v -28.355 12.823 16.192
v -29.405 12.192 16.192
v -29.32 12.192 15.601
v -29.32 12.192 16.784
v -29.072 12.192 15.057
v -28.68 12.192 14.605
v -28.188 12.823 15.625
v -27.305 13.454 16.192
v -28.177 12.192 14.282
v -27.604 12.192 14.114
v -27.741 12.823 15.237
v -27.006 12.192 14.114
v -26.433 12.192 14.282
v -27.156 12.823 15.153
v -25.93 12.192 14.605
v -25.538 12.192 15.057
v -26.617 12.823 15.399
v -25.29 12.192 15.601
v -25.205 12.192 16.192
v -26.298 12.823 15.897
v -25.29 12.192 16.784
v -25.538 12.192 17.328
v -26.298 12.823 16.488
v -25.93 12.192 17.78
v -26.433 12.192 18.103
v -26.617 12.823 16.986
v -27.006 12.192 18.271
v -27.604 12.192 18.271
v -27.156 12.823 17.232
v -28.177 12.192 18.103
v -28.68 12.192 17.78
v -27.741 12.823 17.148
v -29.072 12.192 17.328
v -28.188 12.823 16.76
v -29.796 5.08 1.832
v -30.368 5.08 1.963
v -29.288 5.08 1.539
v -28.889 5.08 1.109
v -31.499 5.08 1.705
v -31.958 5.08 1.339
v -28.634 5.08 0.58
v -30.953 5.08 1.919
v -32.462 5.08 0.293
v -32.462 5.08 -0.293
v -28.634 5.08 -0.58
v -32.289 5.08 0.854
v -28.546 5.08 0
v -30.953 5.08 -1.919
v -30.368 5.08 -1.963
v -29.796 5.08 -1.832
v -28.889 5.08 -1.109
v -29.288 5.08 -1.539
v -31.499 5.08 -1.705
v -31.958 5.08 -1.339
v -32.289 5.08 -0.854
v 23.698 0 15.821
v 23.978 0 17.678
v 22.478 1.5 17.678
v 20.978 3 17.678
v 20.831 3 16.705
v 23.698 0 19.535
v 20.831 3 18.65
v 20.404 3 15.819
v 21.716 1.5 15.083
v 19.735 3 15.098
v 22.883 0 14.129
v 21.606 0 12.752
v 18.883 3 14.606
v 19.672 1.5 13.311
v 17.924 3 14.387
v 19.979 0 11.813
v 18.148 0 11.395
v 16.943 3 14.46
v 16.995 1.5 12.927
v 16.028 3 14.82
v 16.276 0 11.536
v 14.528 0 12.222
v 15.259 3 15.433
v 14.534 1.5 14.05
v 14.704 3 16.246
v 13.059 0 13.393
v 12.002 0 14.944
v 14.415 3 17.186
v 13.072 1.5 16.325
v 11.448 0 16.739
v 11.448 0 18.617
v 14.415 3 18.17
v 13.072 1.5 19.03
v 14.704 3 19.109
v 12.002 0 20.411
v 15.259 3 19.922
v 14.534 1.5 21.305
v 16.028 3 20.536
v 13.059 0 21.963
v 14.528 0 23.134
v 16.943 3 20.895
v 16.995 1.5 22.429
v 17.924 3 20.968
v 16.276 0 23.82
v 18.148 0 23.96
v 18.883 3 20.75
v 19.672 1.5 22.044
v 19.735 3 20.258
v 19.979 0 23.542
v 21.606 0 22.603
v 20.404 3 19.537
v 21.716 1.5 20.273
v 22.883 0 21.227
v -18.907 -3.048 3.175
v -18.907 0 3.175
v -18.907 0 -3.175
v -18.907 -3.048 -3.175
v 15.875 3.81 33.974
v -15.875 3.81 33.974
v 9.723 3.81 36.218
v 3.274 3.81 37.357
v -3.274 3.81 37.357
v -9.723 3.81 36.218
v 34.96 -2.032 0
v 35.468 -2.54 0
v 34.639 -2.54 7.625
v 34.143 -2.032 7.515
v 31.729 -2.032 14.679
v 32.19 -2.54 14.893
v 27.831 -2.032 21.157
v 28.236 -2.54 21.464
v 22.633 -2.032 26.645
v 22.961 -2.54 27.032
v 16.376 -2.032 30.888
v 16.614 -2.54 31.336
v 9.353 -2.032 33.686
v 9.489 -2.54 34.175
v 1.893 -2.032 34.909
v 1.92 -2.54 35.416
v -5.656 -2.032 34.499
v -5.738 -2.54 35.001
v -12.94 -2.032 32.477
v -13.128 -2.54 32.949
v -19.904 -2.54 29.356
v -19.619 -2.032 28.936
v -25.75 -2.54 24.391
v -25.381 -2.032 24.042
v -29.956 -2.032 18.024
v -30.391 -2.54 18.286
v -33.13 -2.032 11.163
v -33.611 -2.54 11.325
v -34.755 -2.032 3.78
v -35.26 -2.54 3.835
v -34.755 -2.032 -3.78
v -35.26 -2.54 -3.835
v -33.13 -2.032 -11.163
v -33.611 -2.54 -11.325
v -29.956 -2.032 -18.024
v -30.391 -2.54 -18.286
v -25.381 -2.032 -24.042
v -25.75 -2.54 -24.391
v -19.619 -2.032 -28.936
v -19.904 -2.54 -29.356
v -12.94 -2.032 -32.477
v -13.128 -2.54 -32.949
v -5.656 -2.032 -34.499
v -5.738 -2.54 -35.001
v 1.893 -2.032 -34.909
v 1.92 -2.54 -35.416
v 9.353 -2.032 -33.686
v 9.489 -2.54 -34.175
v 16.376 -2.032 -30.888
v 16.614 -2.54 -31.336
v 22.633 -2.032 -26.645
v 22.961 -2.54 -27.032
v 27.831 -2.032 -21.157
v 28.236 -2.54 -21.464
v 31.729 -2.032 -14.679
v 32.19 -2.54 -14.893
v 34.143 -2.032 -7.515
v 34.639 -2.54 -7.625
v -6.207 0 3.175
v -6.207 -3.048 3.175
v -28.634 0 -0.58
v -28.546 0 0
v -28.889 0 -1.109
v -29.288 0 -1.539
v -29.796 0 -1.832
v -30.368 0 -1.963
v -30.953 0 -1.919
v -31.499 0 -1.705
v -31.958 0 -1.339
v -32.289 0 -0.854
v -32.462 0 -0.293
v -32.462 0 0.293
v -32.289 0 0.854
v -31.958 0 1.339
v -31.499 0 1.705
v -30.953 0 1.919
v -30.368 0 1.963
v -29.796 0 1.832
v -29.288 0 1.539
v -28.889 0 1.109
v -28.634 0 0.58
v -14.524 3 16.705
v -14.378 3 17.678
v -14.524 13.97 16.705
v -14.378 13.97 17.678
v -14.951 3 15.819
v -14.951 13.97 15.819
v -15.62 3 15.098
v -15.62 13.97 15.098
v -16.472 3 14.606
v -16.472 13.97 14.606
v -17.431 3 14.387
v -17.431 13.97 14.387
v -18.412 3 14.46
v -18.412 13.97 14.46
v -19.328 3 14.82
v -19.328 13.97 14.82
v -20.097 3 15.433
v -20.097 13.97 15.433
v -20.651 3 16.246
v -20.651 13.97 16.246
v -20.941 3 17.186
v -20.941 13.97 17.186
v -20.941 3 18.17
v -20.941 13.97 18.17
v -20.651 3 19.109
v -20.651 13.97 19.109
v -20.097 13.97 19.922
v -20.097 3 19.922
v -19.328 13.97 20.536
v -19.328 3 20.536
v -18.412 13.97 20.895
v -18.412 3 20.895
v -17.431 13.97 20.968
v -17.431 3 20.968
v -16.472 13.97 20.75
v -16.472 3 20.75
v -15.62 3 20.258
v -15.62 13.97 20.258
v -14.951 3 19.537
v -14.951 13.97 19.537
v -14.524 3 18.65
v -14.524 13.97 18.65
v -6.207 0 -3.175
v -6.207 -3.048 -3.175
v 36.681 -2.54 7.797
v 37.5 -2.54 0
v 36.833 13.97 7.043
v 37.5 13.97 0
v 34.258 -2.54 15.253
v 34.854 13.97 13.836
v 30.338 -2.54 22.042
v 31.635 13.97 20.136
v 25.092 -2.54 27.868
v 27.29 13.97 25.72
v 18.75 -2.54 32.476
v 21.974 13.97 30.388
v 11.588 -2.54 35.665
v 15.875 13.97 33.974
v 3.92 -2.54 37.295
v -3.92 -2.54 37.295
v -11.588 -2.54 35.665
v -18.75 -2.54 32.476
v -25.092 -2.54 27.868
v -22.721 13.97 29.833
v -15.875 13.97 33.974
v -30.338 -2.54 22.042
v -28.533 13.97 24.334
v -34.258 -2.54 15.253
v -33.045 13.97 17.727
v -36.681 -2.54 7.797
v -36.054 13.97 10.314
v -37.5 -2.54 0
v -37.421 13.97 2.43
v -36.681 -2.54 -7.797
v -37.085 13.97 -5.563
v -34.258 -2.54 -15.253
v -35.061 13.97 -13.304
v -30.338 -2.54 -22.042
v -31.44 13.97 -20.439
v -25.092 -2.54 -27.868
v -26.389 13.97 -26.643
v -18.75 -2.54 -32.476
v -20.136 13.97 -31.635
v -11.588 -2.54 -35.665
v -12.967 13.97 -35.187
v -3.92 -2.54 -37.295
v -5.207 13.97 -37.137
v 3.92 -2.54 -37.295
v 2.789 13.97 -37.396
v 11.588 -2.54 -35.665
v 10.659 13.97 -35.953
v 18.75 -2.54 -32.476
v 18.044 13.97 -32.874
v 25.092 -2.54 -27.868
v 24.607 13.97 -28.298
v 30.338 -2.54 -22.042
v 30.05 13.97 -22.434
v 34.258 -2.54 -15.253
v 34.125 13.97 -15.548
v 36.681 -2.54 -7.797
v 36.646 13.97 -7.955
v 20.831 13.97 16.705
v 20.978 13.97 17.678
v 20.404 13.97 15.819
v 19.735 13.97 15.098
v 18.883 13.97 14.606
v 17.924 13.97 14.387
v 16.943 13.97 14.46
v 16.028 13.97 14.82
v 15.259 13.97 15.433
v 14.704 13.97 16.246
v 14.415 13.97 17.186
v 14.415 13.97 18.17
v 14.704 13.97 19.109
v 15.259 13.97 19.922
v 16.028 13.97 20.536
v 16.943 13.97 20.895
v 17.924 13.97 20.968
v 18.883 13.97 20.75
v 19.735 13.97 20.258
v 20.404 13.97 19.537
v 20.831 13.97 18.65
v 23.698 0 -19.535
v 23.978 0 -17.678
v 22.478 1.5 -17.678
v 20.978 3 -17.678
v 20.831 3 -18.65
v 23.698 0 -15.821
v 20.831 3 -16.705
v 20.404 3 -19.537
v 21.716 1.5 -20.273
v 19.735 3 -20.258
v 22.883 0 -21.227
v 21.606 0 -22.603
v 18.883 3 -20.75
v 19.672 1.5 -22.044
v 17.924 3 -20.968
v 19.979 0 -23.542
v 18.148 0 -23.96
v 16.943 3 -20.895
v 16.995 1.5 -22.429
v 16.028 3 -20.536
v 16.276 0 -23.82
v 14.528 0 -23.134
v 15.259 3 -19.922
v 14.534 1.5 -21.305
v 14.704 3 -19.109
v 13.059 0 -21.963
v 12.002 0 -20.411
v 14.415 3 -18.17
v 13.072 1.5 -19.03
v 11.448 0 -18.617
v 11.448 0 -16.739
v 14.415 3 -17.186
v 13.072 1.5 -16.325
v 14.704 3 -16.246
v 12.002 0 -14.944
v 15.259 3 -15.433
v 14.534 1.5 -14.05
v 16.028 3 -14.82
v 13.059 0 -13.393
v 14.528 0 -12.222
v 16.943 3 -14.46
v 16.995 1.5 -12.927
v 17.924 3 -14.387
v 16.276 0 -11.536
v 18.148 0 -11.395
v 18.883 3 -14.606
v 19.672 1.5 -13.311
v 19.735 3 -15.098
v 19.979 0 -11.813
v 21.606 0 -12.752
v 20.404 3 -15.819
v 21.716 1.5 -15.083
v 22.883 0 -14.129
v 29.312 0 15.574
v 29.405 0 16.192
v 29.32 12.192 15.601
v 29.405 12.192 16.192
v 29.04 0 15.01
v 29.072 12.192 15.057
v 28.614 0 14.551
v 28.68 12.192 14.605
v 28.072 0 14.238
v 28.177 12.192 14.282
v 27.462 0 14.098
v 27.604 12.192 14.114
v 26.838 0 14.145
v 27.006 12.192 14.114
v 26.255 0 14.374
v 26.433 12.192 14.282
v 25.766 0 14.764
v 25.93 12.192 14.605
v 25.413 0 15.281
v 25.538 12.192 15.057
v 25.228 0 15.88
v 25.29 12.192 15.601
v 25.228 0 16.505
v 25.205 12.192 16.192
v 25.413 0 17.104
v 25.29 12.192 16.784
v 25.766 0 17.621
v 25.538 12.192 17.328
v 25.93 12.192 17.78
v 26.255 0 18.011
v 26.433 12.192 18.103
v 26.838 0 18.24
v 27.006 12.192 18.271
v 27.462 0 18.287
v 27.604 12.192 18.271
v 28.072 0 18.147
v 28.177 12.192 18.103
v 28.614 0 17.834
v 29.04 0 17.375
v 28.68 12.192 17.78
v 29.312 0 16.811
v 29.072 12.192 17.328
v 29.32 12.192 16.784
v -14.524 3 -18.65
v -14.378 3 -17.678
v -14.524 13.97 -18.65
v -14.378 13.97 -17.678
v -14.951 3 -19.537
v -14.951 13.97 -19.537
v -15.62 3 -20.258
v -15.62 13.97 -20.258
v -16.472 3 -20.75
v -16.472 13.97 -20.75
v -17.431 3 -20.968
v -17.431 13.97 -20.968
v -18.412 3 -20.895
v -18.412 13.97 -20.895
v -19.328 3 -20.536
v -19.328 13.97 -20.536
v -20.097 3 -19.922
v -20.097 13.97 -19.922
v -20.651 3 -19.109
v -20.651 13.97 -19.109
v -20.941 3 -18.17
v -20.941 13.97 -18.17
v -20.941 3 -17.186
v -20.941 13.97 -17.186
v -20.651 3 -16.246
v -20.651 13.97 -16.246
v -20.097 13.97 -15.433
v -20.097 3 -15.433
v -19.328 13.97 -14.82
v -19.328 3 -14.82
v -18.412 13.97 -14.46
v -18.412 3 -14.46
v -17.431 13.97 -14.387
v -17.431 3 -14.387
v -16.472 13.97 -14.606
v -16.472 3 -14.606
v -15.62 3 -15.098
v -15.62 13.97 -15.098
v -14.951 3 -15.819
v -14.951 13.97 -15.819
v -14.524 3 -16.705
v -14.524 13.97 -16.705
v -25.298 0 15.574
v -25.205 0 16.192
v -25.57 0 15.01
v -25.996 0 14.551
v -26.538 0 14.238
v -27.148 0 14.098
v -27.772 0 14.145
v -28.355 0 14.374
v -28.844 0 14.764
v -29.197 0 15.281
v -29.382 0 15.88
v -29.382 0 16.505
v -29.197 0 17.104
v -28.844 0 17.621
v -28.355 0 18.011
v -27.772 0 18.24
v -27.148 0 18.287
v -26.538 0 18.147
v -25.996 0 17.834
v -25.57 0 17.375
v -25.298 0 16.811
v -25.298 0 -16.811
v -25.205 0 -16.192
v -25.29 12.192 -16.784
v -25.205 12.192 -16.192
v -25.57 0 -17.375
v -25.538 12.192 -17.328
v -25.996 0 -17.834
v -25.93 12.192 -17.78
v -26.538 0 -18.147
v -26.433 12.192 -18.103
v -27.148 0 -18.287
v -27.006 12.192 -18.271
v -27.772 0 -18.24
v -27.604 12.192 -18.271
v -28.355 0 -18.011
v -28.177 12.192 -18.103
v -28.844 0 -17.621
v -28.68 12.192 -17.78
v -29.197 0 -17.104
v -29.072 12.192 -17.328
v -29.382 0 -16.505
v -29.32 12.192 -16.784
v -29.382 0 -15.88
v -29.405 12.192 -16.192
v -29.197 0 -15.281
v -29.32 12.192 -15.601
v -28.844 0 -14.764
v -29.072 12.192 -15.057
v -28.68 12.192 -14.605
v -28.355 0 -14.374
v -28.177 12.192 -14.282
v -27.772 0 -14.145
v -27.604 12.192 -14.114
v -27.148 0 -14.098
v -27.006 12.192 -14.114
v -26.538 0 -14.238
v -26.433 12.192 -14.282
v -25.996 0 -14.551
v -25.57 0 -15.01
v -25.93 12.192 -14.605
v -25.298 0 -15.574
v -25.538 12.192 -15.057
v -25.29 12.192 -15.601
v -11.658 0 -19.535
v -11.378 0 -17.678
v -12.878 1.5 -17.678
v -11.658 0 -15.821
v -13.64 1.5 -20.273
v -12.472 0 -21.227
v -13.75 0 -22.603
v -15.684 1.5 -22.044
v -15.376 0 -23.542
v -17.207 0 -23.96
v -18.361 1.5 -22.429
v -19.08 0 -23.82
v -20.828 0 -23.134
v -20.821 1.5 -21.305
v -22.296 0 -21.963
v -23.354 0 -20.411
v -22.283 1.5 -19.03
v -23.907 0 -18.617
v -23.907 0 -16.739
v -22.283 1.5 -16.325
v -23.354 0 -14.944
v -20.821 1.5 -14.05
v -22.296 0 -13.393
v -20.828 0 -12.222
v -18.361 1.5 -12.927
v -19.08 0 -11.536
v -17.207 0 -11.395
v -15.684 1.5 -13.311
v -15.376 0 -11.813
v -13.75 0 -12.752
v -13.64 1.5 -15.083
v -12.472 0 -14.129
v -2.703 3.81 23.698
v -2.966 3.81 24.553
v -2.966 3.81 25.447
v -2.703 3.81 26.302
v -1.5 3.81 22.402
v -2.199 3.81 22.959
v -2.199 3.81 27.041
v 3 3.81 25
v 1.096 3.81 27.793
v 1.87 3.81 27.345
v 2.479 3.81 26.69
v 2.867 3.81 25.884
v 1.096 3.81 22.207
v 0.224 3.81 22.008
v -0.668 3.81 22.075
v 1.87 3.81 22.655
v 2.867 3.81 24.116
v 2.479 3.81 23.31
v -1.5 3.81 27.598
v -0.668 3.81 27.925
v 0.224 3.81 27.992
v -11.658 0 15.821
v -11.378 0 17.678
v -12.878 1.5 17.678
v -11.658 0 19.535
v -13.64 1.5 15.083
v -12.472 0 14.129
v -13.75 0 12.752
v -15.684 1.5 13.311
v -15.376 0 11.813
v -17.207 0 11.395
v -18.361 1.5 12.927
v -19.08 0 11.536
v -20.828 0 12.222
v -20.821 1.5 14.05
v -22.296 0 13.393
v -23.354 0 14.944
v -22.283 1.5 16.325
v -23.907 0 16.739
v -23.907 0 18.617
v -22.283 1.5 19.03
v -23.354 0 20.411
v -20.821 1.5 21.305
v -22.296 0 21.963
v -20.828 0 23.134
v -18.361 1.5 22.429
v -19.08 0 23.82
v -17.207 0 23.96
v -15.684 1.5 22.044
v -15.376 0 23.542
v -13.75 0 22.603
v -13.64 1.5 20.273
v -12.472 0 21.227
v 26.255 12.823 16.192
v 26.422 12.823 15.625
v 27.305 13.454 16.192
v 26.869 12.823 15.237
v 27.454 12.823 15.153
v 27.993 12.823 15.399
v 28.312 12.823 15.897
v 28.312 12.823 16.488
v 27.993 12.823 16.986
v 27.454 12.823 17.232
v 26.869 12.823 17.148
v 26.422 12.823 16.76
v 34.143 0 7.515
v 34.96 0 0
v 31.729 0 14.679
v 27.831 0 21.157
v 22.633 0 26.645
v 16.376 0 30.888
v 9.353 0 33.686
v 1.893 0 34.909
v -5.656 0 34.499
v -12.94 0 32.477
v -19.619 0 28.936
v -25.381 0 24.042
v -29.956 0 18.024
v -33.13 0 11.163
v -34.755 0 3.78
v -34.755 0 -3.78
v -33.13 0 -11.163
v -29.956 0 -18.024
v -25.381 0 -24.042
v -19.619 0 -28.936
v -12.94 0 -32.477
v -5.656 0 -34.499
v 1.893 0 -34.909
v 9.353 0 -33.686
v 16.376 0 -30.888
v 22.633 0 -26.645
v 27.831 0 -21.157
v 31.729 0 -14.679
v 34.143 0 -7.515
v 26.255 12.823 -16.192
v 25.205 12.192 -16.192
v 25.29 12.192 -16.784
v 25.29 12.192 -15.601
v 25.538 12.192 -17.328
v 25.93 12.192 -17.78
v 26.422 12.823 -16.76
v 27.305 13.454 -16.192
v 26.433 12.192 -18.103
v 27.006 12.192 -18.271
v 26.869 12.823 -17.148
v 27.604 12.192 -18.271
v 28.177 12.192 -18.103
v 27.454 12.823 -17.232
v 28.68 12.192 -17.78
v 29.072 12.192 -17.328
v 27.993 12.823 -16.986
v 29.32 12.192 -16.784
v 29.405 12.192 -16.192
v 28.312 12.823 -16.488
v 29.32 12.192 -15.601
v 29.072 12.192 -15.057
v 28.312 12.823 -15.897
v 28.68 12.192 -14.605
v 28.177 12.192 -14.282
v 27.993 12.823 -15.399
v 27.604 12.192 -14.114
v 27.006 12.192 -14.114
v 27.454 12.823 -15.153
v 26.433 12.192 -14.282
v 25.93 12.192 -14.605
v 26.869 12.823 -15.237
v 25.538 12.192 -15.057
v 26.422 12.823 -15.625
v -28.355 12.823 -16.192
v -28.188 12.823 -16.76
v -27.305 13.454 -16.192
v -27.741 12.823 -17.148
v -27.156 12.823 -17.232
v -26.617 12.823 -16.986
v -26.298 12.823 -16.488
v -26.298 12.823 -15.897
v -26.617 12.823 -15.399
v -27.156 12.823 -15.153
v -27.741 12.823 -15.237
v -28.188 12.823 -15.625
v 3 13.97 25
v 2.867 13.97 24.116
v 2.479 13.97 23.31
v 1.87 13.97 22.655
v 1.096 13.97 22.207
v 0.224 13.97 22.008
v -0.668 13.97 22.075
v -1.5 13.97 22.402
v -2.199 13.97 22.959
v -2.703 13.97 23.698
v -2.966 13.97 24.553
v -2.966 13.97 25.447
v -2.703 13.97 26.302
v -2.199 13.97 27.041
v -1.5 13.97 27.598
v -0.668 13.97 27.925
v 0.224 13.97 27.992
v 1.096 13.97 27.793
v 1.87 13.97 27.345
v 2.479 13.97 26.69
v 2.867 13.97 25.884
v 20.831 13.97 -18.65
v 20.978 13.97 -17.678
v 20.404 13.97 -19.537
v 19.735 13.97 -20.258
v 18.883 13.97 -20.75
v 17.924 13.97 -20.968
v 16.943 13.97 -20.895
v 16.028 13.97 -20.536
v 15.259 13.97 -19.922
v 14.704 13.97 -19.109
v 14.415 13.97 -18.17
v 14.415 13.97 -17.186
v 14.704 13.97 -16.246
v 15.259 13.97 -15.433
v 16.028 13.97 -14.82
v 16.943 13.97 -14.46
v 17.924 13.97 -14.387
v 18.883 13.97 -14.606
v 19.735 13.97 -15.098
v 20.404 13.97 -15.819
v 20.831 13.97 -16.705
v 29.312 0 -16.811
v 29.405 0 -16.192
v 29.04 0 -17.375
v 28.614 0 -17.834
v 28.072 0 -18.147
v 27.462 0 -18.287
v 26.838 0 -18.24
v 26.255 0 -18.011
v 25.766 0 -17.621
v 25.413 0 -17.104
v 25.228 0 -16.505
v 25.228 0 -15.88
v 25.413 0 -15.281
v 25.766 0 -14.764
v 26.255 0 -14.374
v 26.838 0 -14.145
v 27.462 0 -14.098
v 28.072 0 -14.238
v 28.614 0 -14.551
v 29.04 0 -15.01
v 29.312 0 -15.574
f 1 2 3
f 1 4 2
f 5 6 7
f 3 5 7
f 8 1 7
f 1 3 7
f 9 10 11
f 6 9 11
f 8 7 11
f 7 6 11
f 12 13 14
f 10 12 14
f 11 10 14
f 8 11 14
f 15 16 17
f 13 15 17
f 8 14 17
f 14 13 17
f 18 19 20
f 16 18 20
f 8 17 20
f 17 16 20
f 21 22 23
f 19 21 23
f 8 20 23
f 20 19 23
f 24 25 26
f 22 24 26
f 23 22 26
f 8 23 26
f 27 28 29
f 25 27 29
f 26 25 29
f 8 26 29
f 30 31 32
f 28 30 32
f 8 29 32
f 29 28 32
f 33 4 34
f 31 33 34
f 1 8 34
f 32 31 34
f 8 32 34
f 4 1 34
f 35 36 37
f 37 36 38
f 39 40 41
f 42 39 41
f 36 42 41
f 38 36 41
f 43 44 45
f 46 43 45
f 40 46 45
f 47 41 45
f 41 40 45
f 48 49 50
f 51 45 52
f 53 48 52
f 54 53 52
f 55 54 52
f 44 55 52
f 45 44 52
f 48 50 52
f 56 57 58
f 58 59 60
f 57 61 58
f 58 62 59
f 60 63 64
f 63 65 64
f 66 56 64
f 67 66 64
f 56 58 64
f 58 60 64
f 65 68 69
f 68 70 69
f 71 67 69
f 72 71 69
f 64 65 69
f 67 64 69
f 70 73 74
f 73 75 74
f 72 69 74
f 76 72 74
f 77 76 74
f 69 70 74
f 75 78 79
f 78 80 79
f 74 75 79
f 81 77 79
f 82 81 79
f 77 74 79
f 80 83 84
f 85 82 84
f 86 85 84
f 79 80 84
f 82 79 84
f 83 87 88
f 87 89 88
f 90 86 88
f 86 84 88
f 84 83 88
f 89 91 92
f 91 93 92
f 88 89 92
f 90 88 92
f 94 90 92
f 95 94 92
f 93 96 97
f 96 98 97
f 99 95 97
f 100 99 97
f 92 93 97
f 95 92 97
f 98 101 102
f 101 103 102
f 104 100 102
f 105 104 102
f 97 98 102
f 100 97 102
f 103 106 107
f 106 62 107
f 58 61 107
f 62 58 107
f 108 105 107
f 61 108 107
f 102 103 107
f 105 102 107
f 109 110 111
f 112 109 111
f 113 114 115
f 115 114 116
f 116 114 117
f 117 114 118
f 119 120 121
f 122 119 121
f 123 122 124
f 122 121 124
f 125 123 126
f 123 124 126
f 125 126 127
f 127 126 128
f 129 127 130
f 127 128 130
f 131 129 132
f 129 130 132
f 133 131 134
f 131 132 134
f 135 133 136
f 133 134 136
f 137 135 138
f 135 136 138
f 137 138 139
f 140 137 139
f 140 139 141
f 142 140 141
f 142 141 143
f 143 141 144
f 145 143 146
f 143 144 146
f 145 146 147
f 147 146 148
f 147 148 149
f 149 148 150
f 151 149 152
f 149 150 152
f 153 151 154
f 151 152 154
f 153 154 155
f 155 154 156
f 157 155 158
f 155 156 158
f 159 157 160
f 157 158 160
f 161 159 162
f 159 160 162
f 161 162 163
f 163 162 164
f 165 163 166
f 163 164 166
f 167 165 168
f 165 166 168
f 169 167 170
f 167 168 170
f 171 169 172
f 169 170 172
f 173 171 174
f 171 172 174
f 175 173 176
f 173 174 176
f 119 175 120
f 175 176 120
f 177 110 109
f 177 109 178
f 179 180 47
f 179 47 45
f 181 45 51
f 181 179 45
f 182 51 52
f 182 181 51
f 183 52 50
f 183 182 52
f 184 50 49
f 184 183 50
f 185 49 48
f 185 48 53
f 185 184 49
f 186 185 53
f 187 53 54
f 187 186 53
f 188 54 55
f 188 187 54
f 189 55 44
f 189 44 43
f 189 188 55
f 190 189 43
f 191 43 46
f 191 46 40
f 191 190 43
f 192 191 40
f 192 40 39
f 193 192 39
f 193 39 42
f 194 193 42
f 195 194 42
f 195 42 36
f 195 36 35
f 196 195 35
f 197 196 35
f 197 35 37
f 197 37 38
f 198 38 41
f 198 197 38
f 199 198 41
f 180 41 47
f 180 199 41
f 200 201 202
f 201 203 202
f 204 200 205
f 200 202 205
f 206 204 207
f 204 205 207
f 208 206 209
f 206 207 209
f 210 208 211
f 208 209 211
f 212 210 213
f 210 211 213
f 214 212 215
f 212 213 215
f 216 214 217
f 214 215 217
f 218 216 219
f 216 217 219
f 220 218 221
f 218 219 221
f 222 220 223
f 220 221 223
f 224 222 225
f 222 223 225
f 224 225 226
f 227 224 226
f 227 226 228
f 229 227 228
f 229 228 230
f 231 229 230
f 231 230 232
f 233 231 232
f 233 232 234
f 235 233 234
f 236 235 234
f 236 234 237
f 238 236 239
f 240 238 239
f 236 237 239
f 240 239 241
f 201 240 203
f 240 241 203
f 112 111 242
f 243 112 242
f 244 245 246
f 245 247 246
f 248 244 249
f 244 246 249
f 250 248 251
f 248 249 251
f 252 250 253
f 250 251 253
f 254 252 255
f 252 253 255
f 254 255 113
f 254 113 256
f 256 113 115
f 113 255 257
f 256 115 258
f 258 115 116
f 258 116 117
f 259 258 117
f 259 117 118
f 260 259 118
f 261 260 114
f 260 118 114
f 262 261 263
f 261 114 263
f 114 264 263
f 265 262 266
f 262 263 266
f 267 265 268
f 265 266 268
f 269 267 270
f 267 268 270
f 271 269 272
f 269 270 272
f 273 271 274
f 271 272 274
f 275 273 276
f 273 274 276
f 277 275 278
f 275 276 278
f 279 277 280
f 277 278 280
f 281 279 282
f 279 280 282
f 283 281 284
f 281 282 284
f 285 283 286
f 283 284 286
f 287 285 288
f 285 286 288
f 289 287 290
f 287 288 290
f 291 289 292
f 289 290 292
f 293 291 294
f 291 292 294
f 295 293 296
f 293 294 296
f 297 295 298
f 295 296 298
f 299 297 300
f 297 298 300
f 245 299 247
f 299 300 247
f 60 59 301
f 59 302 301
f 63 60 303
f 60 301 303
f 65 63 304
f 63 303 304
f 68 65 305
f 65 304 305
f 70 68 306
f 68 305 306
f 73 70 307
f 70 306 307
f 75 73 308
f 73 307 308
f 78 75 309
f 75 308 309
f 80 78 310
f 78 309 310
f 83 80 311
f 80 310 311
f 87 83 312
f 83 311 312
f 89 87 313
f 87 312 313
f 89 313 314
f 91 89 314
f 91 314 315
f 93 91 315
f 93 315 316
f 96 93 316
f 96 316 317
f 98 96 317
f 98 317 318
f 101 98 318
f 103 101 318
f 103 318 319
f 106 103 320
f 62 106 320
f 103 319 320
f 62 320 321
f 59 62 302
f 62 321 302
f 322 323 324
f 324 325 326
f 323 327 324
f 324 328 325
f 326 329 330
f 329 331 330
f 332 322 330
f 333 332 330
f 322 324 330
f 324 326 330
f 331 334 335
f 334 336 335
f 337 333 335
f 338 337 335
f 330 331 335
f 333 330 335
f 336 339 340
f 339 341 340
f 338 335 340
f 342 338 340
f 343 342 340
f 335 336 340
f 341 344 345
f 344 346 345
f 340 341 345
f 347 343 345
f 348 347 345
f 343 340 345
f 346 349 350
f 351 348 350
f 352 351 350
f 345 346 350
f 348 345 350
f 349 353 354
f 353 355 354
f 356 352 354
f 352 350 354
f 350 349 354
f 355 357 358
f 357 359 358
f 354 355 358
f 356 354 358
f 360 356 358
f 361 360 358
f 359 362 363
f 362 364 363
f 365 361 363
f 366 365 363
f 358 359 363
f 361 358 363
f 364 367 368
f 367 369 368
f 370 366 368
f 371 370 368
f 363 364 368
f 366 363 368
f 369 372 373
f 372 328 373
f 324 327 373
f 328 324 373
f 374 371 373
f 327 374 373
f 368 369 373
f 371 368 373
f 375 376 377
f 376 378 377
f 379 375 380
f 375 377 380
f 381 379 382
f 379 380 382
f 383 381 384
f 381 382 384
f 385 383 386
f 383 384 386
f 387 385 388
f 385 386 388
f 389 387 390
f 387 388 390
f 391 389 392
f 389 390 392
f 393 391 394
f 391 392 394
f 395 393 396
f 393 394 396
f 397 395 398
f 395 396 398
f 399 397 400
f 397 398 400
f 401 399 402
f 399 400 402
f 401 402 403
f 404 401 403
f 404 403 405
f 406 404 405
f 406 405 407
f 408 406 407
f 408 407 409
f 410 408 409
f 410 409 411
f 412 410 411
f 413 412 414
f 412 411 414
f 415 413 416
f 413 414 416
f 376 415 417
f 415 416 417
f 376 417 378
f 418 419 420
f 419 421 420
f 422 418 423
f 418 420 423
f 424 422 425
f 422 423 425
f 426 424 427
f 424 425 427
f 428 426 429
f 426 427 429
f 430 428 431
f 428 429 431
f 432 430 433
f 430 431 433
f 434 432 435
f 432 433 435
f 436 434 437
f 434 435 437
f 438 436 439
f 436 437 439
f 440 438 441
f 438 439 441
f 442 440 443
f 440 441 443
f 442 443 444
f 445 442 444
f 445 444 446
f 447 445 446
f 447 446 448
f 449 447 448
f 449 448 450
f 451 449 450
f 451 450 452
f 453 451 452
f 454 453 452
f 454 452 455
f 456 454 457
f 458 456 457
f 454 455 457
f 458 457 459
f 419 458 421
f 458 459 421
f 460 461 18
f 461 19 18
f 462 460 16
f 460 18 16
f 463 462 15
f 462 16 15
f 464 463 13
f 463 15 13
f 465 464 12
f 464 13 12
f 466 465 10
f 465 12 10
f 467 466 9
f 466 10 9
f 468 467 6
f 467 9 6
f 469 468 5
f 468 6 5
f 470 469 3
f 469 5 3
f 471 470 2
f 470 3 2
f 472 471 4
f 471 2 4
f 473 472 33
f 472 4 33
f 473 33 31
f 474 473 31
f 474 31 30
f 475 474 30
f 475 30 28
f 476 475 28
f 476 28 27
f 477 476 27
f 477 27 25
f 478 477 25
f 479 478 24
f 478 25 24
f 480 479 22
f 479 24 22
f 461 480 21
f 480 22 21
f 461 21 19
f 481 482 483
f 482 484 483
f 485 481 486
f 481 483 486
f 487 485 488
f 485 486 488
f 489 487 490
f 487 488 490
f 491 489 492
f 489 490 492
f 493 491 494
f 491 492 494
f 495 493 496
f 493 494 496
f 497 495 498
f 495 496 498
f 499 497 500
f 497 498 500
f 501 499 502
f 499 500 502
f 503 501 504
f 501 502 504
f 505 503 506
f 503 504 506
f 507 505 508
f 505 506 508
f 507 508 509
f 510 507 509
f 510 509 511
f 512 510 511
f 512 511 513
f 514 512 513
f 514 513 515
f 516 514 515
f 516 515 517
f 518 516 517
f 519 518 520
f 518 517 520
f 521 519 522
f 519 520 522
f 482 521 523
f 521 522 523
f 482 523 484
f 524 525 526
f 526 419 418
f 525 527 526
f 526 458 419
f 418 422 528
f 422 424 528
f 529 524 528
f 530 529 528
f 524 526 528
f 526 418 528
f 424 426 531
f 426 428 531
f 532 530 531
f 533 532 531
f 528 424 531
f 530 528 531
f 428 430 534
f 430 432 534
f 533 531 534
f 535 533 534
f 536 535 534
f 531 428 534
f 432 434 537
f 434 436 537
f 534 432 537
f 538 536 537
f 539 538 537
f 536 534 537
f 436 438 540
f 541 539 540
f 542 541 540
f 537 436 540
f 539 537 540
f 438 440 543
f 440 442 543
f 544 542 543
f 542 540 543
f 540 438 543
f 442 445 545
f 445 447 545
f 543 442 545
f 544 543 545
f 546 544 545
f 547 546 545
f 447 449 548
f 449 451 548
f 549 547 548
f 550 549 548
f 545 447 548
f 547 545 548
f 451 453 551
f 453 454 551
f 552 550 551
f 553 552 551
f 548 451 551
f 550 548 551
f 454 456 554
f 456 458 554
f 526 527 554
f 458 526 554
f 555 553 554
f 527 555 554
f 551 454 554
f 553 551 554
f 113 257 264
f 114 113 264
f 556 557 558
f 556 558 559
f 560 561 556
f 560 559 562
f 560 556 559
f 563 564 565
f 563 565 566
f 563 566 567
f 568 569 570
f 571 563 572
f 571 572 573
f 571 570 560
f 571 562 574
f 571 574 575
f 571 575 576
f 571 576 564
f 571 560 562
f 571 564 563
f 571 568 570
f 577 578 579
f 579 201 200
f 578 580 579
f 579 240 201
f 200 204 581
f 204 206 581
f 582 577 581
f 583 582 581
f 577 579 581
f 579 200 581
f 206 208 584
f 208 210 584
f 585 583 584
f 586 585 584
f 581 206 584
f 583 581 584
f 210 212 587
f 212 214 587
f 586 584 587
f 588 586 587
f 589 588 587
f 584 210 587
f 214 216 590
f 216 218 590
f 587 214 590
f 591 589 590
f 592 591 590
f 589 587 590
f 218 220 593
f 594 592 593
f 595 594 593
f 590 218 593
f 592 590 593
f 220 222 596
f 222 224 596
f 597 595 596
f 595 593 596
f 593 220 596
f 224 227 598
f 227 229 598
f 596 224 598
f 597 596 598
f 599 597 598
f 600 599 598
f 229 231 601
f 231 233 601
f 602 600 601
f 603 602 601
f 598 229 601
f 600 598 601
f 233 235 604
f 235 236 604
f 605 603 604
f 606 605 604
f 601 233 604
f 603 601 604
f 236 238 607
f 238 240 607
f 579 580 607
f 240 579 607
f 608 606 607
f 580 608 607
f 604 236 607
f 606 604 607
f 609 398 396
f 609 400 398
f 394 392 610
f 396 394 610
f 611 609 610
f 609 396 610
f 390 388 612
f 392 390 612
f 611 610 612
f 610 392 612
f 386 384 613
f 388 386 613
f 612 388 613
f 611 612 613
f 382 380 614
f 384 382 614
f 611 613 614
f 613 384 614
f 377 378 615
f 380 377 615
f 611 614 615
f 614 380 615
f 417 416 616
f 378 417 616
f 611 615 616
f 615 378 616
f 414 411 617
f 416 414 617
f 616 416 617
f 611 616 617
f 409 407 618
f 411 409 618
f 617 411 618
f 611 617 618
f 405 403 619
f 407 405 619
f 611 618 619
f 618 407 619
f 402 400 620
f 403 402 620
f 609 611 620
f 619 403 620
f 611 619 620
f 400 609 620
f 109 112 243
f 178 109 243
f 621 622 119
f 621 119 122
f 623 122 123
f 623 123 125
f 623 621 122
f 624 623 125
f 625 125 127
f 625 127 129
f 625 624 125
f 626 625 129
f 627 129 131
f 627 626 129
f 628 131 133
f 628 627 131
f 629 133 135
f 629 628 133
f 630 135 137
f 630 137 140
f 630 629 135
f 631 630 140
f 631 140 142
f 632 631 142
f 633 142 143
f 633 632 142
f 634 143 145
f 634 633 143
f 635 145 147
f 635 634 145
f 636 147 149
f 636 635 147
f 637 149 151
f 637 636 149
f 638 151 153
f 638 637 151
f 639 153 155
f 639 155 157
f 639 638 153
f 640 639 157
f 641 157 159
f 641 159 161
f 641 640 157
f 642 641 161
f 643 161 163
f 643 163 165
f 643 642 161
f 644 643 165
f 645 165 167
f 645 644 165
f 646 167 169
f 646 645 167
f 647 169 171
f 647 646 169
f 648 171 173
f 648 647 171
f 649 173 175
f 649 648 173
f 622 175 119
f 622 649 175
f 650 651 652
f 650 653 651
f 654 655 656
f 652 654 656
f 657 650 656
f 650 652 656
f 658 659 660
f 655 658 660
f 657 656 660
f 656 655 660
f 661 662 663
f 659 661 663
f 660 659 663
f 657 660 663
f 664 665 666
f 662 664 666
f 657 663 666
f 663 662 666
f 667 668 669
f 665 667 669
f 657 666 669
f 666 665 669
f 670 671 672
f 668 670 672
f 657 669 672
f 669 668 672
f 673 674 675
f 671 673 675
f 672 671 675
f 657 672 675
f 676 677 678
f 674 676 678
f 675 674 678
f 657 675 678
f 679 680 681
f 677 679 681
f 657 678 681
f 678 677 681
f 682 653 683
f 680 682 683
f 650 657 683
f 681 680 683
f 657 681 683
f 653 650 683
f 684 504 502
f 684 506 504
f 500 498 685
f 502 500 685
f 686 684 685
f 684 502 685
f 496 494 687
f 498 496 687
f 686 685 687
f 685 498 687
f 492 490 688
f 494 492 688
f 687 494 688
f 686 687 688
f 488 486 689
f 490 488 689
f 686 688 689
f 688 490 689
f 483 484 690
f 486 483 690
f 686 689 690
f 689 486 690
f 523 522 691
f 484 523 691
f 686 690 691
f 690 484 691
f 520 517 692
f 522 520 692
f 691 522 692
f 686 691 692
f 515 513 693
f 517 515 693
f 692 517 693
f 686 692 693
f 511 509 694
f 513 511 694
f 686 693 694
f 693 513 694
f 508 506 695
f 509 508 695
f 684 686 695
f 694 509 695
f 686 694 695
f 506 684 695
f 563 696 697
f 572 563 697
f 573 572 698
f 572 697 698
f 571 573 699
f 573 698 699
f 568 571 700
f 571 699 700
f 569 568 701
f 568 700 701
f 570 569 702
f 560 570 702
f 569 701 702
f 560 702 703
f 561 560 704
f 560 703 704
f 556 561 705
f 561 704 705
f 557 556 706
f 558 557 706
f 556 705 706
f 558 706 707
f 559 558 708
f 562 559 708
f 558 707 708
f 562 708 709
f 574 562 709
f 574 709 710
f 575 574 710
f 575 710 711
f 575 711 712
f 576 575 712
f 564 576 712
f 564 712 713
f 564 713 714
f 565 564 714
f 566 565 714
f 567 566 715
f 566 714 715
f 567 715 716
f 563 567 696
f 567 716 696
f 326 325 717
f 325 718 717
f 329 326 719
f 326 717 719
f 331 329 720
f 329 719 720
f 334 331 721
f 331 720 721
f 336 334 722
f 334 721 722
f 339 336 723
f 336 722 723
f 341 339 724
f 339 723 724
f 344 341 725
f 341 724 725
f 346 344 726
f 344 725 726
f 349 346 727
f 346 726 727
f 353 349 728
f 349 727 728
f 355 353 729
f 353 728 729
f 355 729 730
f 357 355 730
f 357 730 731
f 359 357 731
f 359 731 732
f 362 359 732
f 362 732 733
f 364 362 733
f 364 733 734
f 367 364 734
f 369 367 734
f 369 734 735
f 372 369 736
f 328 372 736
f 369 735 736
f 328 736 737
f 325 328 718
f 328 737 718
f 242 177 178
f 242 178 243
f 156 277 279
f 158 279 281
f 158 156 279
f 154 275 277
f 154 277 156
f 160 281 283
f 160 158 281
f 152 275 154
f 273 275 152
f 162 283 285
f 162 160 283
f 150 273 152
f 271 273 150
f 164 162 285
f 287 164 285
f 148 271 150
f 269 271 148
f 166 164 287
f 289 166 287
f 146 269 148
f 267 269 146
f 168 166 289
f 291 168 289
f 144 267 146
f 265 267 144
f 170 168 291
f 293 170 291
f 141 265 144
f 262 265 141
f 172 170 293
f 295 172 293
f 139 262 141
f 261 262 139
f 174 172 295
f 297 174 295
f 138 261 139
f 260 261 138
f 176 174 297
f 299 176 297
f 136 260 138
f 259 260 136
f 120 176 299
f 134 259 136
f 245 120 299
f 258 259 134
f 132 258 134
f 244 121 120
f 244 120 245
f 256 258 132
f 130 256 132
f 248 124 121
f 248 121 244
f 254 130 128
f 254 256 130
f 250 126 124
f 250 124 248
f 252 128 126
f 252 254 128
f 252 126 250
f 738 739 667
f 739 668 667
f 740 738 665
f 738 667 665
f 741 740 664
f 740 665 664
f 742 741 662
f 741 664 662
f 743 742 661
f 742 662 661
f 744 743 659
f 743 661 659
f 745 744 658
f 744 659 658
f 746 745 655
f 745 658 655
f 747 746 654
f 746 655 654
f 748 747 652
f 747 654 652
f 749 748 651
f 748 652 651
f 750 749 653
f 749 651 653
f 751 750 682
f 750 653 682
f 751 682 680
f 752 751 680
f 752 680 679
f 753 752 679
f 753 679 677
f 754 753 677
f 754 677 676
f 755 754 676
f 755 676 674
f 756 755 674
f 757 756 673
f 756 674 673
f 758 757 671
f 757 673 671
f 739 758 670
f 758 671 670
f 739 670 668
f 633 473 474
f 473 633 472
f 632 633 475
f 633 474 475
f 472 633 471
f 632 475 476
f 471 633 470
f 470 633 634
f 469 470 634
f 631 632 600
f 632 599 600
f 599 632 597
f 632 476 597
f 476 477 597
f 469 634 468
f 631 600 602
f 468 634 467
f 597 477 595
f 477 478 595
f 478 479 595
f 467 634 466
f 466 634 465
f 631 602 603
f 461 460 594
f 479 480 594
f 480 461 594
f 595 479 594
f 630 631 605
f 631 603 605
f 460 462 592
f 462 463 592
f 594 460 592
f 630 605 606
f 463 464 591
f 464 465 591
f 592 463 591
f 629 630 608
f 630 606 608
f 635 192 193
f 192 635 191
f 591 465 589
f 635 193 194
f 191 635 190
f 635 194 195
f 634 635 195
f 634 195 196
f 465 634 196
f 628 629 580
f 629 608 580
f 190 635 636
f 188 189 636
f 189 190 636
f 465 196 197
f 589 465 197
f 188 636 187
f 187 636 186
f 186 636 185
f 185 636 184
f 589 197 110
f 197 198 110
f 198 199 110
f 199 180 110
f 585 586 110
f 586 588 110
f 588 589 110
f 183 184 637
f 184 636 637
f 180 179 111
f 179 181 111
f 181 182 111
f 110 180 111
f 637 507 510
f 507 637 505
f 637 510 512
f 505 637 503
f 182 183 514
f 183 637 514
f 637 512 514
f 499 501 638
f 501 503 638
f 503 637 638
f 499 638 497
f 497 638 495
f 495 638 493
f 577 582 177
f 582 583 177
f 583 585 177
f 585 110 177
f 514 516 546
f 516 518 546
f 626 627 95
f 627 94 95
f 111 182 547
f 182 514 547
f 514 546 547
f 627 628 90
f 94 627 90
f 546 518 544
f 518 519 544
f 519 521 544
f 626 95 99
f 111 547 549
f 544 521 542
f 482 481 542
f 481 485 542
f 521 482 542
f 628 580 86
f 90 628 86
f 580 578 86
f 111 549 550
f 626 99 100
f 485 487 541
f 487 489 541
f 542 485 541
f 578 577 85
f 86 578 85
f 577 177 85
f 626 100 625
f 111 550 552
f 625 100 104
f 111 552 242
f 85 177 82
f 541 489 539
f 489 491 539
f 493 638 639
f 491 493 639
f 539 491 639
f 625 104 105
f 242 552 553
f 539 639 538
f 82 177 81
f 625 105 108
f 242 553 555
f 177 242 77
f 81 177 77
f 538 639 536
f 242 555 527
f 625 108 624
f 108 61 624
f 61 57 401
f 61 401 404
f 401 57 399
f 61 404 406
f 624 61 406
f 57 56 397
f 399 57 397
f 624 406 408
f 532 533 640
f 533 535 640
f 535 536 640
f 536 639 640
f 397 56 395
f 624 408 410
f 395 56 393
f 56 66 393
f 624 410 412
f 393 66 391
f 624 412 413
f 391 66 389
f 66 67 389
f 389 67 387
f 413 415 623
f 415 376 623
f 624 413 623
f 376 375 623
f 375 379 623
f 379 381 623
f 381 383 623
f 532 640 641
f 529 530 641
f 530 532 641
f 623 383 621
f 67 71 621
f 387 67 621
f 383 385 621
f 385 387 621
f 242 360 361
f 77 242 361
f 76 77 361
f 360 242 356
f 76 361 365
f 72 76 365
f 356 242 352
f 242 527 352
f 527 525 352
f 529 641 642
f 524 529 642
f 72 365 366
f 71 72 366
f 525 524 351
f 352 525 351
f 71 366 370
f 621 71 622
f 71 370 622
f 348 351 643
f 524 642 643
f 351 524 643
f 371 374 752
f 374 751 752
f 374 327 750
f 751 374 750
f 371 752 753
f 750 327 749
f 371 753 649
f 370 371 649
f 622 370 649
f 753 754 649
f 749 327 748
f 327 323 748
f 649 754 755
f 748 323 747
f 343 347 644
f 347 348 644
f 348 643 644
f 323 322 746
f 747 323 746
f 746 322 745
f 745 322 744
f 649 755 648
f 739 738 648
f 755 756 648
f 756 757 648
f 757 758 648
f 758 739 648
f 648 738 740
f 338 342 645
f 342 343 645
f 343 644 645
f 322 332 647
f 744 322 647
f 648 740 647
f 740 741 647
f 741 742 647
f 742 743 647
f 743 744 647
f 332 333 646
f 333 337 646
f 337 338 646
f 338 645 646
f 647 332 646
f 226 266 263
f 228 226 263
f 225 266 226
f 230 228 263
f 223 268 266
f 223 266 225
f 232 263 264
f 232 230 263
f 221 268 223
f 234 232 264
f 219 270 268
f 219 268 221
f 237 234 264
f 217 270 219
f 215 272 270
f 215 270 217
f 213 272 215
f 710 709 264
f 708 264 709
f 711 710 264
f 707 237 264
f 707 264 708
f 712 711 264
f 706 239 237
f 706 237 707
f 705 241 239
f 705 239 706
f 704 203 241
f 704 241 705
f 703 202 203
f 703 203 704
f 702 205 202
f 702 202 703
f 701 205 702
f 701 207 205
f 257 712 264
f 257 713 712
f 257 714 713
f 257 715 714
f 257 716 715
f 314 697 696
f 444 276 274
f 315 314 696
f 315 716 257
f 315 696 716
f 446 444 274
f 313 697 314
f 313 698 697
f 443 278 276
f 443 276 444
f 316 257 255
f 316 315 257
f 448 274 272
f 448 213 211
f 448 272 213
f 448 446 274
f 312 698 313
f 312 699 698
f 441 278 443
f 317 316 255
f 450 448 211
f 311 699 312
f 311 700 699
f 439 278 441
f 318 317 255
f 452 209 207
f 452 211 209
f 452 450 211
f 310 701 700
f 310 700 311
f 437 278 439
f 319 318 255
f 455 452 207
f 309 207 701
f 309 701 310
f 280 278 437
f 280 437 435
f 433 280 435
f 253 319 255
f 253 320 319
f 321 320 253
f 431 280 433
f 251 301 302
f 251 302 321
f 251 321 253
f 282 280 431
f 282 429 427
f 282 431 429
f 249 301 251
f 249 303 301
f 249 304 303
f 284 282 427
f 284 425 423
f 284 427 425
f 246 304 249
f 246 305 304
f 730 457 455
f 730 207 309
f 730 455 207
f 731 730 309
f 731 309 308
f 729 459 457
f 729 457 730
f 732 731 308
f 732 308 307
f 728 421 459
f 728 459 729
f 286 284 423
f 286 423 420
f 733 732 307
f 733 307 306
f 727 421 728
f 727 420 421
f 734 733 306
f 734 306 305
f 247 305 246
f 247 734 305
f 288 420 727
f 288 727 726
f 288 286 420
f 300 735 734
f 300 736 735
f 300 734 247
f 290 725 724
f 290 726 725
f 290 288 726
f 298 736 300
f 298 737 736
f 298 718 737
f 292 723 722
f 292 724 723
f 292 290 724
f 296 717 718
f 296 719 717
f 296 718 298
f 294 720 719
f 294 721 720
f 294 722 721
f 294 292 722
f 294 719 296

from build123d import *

# Parameters (mm, degrees)
SKETCH2_R                                       = 37.5
BOSS_EXTRUDE1_DEPTH                             = 13.97
CSK_FOR_M6_FLAT_HEAD_MACHINE_SCREW1_D           = 6.6
CSK_FOR_M6_FLAT_HEAD_MACHINE_SCREW1_CSINK_D     = 12.6
CSK_FOR_M6_FLAT_HEAD_MACHINE_SCREW1_CSINK_ANGLE = 90
M5X0_8_TAPPED_HOLE1_D                           = 4.2
M5X0_8_TAPPED_HOLE1_DEPTH                       = 12.192
M5X0_8_TAPPED_HOLE1_TIP                         = 1.2618073
SKETCH1_R                                       = 1.9685
CUT_EXTRUDE1_DEPTH                              = 5.08
SKETCH1_3_W                                     = 12.7
SKETCH1_3_H                                     = 6.35
POGO_PINS_DEPTH                                 = 3.048
CUT_EXTRUDE2_START                              = -10.16
SKETCH8_R                                       = 3
CUT_EXTRUDE2_DEPTH                              = 10.16
LIP_START                                       = 2.54
SKETCH9_R                                       = 37.5
SKETCH9_R_2                                     = 34.96
LIP_DEPTH                                       = 2.54
CHAMFER1_SIZE                                   = 0.508


with BuildPart() as part:
    # Sketch2 → Boss-Extrude1 (new body)
    with BuildSketch(Plane(origin=(0, 0, 0), x_dir=(1, 0, 0), z_dir=(0, 1, 0))):
        Circle(SKETCH2_R)
    extrude(amount=BOSS_EXTRUDE1_DEPTH)

    # CSK for M6 Flat Head Machine Screw1 (through all)
    with Locations(Plane(origin=(0, 0, 0), x_dir=(-1, 0, 0), z_dir=(0, -1, 0))):
        with Locations((-17.67766953, 17.67766953), (17.67766953, 17.67766953), (17.67766953, -17.67766953), (-17.67766953, -17.67766953)):
            CounterSinkHole(CSK_FOR_M6_FLAT_HEAD_MACHINE_SCREW1_D / 2, CSK_FOR_M6_FLAT_HEAD_MACHINE_SCREW1_CSINK_D / 2, counter_sink_angle=CSK_FOR_M6_FLAT_HEAD_MACHINE_SCREW1_CSINK_ANGLE)

    # M5x0.8 Tapped Hole1
    with Locations(Plane(origin=(0, 0, 0), x_dir=(-1, 0, 0), z_dir=(0, -1, 0))):
        with Locations((-27.305, 16.1925), (-27.305, -16.1925), (27.305, -16.1925), (27.305, 16.1925)):
            Hole(M5X0_8_TAPPED_HOLE1_D / 2, depth=M5X0_8_TAPPED_HOLE1_DEPTH)
            with Locations((0, 0, -(M5X0_8_TAPPED_HOLE1_DEPTH + M5X0_8_TAPPED_HOLE1_TIP / 2))):  # 118° drill point
                Cone(0, M5X0_8_TAPPED_HOLE1_D / 2, M5X0_8_TAPPED_HOLE1_TIP, mode=Mode.SUBTRACT)

    # Sketch1 → Cut-Extrude1 (cut)
    with BuildSketch(Plane(origin=(0, 0, 0), x_dir=(1, 0, 0), z_dir=(0, 1, 0))):
        with Locations((-30.515, 0)):
            Circle(SKETCH1_R)
    extrude(amount=CUT_EXTRUDE1_DEPTH, mode=Mode.SUBTRACT)

    # Sketch1<3> → Pogo pins (add)
    with BuildSketch(Plane(origin=(0, 0, 0), x_dir=(1, 0, 0), z_dir=(0, 1, 0))):
        with Locations((-12.5572, 0)):
            Rectangle(SKETCH1_3_W, SKETCH1_3_H)
    extrude(amount=-POGO_PINS_DEPTH)

    # Sketch8 → Cut-Extrude2 (cut)
    with BuildSketch(Plane(origin=(0, 13.97, 0), x_dir=(1, 0, 0), z_dir=(0, 1, 0)).offset(CUT_EXTRUDE2_START)):
        with BuildLine():
            ThreePointArc((-15.875, -33.974025004), (0, -37.5), (15.875, -33.974025004))
            Line((15.875, -33.974025004), (-15.875, -33.974025004))
        make_face()
        with Locations((0, -25)):
            Circle(SKETCH8_R)
    extrude(amount=CUT_EXTRUDE2_DEPTH, mode=Mode.SUBTRACT)

    # Sketch9 → Lip (add)
    with BuildSketch(Plane.XZ.offset(LIP_START)):
        Circle(SKETCH9_R)
        Circle(SKETCH9_R_2, mode=Mode.SUBTRACT)
    extrude(amount=-LIP_DEPTH)

    # Chamfer1
    chamfer1_edges = [part.edges().sort_by_distance(p)[0] for p in [
        (-34.96, -2.54, 0),
    ]]
    chamfer(chamfer1_edges, length=CHAMFER1_SIZE)


solid = part.part
